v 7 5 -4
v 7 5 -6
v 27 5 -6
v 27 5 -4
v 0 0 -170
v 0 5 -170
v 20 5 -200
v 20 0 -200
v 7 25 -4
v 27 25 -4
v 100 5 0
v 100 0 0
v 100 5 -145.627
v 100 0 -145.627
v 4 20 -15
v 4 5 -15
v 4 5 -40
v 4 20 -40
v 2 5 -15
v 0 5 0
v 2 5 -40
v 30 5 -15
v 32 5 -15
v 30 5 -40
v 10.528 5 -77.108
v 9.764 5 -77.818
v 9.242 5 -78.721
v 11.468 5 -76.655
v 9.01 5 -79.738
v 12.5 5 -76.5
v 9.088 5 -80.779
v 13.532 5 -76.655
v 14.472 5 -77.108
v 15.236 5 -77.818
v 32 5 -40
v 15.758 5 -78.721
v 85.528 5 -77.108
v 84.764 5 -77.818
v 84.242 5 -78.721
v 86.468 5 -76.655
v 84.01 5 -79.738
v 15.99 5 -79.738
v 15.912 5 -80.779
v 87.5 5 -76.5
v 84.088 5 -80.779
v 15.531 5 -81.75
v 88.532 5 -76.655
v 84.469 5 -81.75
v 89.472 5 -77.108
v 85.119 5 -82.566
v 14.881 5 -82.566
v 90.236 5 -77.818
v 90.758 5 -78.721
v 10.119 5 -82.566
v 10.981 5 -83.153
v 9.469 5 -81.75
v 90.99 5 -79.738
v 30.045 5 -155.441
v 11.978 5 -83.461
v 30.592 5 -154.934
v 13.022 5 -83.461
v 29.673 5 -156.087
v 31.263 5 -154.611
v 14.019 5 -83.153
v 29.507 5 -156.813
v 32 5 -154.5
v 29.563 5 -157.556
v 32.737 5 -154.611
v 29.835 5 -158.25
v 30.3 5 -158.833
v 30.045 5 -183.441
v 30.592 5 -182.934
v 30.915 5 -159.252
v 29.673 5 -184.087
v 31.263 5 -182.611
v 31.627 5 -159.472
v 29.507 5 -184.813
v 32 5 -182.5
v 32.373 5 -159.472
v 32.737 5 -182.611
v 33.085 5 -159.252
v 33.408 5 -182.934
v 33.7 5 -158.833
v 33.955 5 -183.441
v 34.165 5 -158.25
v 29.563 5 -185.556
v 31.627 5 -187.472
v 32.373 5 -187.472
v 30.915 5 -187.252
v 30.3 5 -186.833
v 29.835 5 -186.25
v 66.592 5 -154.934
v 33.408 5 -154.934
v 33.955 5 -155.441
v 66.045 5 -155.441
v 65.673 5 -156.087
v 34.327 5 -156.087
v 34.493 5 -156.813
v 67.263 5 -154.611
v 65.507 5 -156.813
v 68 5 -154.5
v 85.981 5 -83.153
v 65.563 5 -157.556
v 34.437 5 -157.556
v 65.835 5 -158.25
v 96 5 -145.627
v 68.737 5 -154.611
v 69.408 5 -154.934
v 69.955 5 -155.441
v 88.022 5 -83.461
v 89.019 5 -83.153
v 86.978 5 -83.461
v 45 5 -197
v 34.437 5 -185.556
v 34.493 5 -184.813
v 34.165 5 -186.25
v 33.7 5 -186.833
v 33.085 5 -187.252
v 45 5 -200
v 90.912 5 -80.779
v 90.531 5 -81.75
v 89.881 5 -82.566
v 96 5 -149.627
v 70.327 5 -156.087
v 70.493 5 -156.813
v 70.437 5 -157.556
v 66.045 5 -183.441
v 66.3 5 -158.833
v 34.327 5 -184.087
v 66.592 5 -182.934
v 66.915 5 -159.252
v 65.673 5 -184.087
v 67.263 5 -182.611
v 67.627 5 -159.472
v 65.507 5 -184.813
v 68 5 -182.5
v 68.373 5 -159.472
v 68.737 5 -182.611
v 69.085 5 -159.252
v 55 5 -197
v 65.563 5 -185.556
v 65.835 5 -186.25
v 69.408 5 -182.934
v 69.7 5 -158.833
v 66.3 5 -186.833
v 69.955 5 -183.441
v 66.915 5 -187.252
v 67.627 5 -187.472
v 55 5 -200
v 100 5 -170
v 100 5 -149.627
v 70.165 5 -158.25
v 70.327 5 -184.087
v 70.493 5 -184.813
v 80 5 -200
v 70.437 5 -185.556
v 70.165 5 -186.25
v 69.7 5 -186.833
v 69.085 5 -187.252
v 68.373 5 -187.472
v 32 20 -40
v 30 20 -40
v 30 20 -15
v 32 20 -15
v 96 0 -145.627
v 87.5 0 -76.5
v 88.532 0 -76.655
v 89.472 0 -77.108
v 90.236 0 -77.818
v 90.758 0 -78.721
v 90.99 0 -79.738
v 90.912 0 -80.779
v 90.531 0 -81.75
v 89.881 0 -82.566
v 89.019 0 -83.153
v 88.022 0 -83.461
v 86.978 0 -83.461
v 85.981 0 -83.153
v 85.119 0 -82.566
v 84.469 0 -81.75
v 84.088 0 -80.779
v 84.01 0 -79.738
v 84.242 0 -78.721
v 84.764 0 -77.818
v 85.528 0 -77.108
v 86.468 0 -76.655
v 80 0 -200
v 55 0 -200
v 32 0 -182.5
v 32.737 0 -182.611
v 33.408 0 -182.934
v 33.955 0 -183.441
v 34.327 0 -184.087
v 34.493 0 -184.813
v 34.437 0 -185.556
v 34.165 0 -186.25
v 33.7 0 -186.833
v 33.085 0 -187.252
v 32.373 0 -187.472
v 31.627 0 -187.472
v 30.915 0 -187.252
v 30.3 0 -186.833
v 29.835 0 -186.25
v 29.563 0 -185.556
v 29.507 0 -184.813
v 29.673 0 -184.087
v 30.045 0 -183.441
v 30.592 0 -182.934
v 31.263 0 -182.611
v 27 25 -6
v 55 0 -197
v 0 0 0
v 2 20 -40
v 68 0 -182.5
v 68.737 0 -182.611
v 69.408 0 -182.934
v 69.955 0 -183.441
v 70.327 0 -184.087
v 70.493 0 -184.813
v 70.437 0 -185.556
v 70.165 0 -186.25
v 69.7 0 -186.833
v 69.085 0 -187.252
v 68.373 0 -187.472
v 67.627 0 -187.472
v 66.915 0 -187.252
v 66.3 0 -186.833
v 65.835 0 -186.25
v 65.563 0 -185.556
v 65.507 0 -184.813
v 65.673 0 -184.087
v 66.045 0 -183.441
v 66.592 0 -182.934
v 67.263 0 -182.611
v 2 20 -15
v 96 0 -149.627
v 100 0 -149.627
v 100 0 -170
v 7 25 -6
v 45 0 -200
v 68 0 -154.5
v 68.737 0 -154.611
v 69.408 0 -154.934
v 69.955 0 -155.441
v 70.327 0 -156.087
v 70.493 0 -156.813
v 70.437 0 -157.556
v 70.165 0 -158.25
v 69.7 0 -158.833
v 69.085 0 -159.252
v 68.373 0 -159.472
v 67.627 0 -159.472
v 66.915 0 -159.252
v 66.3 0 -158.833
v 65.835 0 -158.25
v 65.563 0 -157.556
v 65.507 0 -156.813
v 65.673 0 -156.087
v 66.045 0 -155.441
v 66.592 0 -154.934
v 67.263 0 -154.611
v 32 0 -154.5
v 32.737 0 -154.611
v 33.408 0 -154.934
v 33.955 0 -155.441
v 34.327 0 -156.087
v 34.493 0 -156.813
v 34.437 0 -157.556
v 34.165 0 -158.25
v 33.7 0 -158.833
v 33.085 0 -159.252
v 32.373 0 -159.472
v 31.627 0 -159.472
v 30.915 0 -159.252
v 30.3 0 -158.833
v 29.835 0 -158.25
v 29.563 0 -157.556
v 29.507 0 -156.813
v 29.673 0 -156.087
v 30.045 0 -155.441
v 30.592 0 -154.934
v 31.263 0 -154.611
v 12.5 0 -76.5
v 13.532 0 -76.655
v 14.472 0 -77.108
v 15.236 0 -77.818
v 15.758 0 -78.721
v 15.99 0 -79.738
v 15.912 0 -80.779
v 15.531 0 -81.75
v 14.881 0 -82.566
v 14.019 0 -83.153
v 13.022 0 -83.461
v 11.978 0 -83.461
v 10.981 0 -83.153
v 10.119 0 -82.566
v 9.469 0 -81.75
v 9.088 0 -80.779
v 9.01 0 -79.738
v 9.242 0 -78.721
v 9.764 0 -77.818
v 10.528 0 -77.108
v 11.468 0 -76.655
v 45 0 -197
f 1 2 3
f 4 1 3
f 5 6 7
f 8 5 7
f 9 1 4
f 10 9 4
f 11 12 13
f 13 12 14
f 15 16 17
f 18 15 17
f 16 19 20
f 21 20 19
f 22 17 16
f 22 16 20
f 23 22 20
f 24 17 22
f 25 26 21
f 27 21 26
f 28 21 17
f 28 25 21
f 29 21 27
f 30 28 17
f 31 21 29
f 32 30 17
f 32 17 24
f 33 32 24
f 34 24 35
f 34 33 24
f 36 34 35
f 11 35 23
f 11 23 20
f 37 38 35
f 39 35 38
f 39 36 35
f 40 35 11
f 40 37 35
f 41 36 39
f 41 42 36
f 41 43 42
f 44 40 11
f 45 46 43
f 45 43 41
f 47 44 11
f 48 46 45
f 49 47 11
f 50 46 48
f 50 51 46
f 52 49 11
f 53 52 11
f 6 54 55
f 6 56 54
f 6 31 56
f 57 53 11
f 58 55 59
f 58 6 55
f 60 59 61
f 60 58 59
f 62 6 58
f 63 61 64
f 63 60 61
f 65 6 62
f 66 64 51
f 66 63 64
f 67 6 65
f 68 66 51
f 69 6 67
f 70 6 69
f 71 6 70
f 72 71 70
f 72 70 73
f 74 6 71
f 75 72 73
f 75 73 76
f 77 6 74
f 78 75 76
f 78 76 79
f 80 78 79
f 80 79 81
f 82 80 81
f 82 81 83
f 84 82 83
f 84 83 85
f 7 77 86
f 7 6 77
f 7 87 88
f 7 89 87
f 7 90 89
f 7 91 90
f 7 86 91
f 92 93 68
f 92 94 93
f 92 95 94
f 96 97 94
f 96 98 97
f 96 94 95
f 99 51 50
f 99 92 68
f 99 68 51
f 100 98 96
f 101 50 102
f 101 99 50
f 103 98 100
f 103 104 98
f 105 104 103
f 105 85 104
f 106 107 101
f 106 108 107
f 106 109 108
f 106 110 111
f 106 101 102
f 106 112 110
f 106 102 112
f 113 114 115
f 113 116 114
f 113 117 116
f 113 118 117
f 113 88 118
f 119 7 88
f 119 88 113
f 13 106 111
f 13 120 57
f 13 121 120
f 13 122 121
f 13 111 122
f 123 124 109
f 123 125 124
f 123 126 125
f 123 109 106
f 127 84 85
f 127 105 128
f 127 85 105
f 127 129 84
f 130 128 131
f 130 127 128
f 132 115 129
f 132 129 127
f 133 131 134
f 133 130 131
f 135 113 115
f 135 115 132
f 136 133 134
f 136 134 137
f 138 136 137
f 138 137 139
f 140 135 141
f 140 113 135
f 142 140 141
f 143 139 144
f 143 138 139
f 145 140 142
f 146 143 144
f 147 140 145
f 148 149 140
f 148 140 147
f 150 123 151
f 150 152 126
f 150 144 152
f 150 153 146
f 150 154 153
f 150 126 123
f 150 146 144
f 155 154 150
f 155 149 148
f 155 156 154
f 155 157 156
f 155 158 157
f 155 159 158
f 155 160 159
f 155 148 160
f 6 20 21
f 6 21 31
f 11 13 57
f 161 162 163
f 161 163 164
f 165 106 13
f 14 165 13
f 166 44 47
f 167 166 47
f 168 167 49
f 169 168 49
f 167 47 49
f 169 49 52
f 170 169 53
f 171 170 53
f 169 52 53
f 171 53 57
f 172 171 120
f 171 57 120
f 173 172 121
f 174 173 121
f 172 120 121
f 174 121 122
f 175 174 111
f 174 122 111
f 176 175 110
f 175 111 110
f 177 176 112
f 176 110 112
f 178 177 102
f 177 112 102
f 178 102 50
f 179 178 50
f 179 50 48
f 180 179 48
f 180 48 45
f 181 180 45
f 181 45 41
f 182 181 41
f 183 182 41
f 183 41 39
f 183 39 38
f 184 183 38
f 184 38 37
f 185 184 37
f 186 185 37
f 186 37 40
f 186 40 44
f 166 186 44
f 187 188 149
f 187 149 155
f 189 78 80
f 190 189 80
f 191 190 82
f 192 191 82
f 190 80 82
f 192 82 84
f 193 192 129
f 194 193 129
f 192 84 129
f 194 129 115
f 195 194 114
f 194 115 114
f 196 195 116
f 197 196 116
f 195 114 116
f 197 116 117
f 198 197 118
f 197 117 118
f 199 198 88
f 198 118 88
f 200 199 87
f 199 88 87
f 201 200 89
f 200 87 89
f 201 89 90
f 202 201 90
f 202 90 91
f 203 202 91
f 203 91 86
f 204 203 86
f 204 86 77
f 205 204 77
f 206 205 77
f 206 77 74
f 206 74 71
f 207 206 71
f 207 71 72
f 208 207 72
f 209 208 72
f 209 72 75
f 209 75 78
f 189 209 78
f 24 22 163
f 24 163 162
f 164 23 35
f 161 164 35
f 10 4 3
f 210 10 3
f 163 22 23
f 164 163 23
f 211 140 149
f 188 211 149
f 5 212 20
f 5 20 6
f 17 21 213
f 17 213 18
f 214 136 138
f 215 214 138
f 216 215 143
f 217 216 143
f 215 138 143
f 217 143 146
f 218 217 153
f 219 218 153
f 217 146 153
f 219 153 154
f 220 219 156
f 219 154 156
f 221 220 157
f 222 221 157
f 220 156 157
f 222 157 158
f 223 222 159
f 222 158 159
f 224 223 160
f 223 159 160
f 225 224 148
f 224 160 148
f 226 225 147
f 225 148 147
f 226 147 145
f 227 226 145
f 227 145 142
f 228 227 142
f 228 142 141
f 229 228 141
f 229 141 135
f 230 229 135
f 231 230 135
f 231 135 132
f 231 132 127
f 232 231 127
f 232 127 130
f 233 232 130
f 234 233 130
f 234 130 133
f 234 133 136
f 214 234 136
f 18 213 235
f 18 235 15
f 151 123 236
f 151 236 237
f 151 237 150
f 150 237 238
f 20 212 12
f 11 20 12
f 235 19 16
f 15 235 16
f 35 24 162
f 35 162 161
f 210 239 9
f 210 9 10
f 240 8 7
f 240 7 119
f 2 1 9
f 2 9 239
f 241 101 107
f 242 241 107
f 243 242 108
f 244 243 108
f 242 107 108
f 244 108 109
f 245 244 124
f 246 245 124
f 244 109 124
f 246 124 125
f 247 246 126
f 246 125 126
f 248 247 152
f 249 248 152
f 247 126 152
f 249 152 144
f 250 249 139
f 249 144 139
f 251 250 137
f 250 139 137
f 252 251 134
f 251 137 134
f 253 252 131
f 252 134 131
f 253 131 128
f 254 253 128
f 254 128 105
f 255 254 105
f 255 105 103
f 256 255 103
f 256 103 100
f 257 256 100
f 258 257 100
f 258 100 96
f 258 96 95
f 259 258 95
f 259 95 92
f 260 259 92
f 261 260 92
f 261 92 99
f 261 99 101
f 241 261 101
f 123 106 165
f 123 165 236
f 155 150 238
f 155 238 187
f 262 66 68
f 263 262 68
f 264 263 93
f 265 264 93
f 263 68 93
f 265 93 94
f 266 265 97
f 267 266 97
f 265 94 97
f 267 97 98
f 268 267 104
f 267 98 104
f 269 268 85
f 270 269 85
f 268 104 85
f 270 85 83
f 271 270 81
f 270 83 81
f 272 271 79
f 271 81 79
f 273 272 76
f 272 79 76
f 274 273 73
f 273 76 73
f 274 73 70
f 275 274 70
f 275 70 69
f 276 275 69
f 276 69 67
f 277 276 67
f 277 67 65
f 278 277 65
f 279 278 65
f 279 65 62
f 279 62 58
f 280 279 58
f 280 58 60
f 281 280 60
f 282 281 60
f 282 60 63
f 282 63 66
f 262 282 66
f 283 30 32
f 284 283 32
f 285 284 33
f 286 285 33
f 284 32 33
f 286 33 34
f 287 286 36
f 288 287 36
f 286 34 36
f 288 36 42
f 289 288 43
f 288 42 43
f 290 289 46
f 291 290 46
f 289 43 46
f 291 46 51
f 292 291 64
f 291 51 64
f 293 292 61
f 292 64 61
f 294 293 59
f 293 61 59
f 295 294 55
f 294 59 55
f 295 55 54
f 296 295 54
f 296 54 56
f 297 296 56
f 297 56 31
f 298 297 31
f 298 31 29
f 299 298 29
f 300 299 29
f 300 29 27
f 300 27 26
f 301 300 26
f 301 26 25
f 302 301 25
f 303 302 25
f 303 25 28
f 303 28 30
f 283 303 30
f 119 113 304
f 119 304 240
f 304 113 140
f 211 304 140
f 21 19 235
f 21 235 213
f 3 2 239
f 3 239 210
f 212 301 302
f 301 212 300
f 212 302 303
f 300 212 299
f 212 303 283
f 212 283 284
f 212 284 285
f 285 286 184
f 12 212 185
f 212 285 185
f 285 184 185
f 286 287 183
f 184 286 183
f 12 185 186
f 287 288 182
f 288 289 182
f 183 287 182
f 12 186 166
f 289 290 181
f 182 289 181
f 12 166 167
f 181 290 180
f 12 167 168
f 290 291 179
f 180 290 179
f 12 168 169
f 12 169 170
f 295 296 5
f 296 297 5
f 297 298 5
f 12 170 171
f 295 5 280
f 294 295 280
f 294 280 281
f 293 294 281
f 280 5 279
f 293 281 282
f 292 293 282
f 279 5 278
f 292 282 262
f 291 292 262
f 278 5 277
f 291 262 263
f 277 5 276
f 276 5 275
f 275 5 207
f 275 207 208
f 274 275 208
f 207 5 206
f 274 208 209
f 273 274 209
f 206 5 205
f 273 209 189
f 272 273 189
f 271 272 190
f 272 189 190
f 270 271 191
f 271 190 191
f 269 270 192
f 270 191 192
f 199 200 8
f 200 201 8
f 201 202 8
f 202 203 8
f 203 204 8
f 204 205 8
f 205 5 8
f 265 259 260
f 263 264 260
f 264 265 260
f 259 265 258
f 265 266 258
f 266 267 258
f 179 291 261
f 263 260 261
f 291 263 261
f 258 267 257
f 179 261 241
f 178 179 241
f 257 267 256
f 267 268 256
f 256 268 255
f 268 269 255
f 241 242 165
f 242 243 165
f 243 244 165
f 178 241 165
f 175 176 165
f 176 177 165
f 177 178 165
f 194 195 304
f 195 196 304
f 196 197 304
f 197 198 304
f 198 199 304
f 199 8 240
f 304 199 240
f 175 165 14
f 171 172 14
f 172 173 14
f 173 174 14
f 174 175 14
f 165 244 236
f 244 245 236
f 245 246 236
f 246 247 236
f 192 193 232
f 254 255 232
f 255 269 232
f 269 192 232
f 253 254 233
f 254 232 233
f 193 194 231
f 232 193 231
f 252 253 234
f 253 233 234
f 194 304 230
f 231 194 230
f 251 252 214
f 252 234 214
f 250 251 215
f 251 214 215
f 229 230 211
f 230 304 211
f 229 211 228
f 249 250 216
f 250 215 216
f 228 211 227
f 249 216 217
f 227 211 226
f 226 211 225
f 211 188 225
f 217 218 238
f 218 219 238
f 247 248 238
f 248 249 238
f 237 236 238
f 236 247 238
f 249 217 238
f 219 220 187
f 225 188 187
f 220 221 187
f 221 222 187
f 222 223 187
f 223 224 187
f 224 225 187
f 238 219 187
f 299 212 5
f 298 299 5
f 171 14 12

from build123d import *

# Parameters (mm, degrees)
CROQUIS1_W              = 100
CROQUIS1_H              = 200
SALIENTE_EXTRUIR3_DEPTH = 5
CROQUIS5_R              = 2.5
CORTAR_EXTRUIR1_DEPTH   = 224.662692463
CROQUIS11_R             = 3.5
CORTAR_EXTRUIR5_DEPTH   = 224.662692463
CROQUIS12_W             = 10
CROQUIS12_H             = 3
CORTAR_EXTRUIR6_DEPTH   = 224.662692463
CORTAR_EXTRUIR7_DEPTH   = 224.662692463
CROQUIS15_W             = 4
CROQUIS15_H             = 4
CORTAR_EXTRUIR9_DEPTH   = 224.662692463
CROQUIS16_W             = 20
CROQUIS16_H             = 2
SALIENTE_EXTRUIR6_DEPTH = 20
CROQUIS17_W             = 2
CROQUIS17_H             = 25
SALIENTE_EXTRUIR7_DEPTH = 15


with BuildPart() as part:
    # Croquis1 → Saliente-Extruir3 (new body)
    with BuildSketch(Plane(origin=(0, 0, 0), x_dir=(1, 0, 0), z_dir=(0, 1, 0))):
        with Locations((50, 100)):
            Rectangle(CROQUIS1_W, CROQUIS1_H)
    extrude(amount=SALIENTE_EXTRUIR3_DEPTH)

    # Croquis5 → Cortar-Extruir1 (cut, through all)
    with BuildSketch(Plane(origin=(0, 5, 0), x_dir=(1, 0, 0), z_dir=(0, 1, 0))):
        with Locations(Location((32, 185, 0), (0, 0, 270))):
            Circle(CROQUIS5_R)
        with Locations(Location((68, 185, 0), (0, 0, 270))):
            Circle(CROQUIS5_R)
        with Locations(Location((32, 157, 0), (0, 0, 270))):
            Circle(CROQUIS5_R)
        with Locations(Location((68, 157, 0), (0, 0, 270))):
            Circle(CROQUIS5_R)
    extrude(amount=-CORTAR_EXTRUIR1_DEPTH, mode=Mode.SUBTRACT)

    # Croquis11 → Cortar-Extruir5 (cut, through all)
    with BuildSketch(Plane(origin=(0, 5, 0), x_dir=(1, 0, 0), z_dir=(0, 1, 0))):
        with Locations(Location((12.5, 80, 0), (0, 0, 270))):
            Circle(CROQUIS11_R)
        with Locations(Location((87.5, 80, 0), (0, 0, 270))):
            Circle(CROQUIS11_R)
    extrude(amount=-CORTAR_EXTRUIR5_DEPTH, mode=Mode.SUBTRACT)

    # Croquis12 → Cortar-Extruir6 (cut, through all)
    with BuildSketch(Plane(origin=(0, 5, 0), x_dir=(1, 0, 0), z_dir=(0, 1, 0))):
        with Locations((50, 198.5)):
            Rectangle(CROQUIS12_W, CROQUIS12_H)
    extrude(amount=-CORTAR_EXTRUIR6_DEPTH, mode=Mode.SUBTRACT)

    # Croquis13 → Cortar-Extruir7 (cut, through all)
    with BuildSketch(Plane(origin=(0, 5, 0), x_dir=(1, 0, 0), z_dir=(0, 1, 0))):
        Polygon((0, 170), (20, 200), (0, 200), align=None)
        Polygon((100, 170), (80, 200), (100, 200), align=None)
    extrude(amount=-CORTAR_EXTRUIR7_DEPTH, mode=Mode.SUBTRACT)

    # Croquis15 → Cortar-Extruir9 (cut, through all)
    with BuildSketch(Plane(origin=(0, 5, 0), x_dir=(1, 0, 0), z_dir=(0, 1, 0))):
        with Locations((98, 147.627138927)):
            Rectangle(CROQUIS15_W, CROQUIS15_H)
    extrude(amount=-CORTAR_EXTRUIR9_DEPTH, mode=Mode.SUBTRACT)

    # Croquis17 → Saliente-Extruir7 (add)
    with BuildSketch(Plane(origin=(0, 5, 0), x_dir=(1, 0, 0), z_dir=(0, 1, 0))):
        with Locations((31, 27.5)):
            Rectangle(CROQUIS17_W, CROQUIS17_H)
        with Locations((3, 27.5)):
            Rectangle(CROQUIS17_W, CROQUIS17_H)
    extrude(amount=SALIENTE_EXTRUIR7_DEPTH)


with BuildPart() as body_2:
    # Croquis16 → Saliente-Extruir6 (new body)
    with BuildSketch(Plane(origin=(0, 5, 0), x_dir=(1, 0, 0), z_dir=(0, 1, 0))):
        with Locations((17, 5)):
            Rectangle(CROQUIS16_W, CROQUIS16_H)
    extrude(amount=SALIENTE_EXTRUIR6_DEPTH)


solid = Compound([part.part, body_2.part])
